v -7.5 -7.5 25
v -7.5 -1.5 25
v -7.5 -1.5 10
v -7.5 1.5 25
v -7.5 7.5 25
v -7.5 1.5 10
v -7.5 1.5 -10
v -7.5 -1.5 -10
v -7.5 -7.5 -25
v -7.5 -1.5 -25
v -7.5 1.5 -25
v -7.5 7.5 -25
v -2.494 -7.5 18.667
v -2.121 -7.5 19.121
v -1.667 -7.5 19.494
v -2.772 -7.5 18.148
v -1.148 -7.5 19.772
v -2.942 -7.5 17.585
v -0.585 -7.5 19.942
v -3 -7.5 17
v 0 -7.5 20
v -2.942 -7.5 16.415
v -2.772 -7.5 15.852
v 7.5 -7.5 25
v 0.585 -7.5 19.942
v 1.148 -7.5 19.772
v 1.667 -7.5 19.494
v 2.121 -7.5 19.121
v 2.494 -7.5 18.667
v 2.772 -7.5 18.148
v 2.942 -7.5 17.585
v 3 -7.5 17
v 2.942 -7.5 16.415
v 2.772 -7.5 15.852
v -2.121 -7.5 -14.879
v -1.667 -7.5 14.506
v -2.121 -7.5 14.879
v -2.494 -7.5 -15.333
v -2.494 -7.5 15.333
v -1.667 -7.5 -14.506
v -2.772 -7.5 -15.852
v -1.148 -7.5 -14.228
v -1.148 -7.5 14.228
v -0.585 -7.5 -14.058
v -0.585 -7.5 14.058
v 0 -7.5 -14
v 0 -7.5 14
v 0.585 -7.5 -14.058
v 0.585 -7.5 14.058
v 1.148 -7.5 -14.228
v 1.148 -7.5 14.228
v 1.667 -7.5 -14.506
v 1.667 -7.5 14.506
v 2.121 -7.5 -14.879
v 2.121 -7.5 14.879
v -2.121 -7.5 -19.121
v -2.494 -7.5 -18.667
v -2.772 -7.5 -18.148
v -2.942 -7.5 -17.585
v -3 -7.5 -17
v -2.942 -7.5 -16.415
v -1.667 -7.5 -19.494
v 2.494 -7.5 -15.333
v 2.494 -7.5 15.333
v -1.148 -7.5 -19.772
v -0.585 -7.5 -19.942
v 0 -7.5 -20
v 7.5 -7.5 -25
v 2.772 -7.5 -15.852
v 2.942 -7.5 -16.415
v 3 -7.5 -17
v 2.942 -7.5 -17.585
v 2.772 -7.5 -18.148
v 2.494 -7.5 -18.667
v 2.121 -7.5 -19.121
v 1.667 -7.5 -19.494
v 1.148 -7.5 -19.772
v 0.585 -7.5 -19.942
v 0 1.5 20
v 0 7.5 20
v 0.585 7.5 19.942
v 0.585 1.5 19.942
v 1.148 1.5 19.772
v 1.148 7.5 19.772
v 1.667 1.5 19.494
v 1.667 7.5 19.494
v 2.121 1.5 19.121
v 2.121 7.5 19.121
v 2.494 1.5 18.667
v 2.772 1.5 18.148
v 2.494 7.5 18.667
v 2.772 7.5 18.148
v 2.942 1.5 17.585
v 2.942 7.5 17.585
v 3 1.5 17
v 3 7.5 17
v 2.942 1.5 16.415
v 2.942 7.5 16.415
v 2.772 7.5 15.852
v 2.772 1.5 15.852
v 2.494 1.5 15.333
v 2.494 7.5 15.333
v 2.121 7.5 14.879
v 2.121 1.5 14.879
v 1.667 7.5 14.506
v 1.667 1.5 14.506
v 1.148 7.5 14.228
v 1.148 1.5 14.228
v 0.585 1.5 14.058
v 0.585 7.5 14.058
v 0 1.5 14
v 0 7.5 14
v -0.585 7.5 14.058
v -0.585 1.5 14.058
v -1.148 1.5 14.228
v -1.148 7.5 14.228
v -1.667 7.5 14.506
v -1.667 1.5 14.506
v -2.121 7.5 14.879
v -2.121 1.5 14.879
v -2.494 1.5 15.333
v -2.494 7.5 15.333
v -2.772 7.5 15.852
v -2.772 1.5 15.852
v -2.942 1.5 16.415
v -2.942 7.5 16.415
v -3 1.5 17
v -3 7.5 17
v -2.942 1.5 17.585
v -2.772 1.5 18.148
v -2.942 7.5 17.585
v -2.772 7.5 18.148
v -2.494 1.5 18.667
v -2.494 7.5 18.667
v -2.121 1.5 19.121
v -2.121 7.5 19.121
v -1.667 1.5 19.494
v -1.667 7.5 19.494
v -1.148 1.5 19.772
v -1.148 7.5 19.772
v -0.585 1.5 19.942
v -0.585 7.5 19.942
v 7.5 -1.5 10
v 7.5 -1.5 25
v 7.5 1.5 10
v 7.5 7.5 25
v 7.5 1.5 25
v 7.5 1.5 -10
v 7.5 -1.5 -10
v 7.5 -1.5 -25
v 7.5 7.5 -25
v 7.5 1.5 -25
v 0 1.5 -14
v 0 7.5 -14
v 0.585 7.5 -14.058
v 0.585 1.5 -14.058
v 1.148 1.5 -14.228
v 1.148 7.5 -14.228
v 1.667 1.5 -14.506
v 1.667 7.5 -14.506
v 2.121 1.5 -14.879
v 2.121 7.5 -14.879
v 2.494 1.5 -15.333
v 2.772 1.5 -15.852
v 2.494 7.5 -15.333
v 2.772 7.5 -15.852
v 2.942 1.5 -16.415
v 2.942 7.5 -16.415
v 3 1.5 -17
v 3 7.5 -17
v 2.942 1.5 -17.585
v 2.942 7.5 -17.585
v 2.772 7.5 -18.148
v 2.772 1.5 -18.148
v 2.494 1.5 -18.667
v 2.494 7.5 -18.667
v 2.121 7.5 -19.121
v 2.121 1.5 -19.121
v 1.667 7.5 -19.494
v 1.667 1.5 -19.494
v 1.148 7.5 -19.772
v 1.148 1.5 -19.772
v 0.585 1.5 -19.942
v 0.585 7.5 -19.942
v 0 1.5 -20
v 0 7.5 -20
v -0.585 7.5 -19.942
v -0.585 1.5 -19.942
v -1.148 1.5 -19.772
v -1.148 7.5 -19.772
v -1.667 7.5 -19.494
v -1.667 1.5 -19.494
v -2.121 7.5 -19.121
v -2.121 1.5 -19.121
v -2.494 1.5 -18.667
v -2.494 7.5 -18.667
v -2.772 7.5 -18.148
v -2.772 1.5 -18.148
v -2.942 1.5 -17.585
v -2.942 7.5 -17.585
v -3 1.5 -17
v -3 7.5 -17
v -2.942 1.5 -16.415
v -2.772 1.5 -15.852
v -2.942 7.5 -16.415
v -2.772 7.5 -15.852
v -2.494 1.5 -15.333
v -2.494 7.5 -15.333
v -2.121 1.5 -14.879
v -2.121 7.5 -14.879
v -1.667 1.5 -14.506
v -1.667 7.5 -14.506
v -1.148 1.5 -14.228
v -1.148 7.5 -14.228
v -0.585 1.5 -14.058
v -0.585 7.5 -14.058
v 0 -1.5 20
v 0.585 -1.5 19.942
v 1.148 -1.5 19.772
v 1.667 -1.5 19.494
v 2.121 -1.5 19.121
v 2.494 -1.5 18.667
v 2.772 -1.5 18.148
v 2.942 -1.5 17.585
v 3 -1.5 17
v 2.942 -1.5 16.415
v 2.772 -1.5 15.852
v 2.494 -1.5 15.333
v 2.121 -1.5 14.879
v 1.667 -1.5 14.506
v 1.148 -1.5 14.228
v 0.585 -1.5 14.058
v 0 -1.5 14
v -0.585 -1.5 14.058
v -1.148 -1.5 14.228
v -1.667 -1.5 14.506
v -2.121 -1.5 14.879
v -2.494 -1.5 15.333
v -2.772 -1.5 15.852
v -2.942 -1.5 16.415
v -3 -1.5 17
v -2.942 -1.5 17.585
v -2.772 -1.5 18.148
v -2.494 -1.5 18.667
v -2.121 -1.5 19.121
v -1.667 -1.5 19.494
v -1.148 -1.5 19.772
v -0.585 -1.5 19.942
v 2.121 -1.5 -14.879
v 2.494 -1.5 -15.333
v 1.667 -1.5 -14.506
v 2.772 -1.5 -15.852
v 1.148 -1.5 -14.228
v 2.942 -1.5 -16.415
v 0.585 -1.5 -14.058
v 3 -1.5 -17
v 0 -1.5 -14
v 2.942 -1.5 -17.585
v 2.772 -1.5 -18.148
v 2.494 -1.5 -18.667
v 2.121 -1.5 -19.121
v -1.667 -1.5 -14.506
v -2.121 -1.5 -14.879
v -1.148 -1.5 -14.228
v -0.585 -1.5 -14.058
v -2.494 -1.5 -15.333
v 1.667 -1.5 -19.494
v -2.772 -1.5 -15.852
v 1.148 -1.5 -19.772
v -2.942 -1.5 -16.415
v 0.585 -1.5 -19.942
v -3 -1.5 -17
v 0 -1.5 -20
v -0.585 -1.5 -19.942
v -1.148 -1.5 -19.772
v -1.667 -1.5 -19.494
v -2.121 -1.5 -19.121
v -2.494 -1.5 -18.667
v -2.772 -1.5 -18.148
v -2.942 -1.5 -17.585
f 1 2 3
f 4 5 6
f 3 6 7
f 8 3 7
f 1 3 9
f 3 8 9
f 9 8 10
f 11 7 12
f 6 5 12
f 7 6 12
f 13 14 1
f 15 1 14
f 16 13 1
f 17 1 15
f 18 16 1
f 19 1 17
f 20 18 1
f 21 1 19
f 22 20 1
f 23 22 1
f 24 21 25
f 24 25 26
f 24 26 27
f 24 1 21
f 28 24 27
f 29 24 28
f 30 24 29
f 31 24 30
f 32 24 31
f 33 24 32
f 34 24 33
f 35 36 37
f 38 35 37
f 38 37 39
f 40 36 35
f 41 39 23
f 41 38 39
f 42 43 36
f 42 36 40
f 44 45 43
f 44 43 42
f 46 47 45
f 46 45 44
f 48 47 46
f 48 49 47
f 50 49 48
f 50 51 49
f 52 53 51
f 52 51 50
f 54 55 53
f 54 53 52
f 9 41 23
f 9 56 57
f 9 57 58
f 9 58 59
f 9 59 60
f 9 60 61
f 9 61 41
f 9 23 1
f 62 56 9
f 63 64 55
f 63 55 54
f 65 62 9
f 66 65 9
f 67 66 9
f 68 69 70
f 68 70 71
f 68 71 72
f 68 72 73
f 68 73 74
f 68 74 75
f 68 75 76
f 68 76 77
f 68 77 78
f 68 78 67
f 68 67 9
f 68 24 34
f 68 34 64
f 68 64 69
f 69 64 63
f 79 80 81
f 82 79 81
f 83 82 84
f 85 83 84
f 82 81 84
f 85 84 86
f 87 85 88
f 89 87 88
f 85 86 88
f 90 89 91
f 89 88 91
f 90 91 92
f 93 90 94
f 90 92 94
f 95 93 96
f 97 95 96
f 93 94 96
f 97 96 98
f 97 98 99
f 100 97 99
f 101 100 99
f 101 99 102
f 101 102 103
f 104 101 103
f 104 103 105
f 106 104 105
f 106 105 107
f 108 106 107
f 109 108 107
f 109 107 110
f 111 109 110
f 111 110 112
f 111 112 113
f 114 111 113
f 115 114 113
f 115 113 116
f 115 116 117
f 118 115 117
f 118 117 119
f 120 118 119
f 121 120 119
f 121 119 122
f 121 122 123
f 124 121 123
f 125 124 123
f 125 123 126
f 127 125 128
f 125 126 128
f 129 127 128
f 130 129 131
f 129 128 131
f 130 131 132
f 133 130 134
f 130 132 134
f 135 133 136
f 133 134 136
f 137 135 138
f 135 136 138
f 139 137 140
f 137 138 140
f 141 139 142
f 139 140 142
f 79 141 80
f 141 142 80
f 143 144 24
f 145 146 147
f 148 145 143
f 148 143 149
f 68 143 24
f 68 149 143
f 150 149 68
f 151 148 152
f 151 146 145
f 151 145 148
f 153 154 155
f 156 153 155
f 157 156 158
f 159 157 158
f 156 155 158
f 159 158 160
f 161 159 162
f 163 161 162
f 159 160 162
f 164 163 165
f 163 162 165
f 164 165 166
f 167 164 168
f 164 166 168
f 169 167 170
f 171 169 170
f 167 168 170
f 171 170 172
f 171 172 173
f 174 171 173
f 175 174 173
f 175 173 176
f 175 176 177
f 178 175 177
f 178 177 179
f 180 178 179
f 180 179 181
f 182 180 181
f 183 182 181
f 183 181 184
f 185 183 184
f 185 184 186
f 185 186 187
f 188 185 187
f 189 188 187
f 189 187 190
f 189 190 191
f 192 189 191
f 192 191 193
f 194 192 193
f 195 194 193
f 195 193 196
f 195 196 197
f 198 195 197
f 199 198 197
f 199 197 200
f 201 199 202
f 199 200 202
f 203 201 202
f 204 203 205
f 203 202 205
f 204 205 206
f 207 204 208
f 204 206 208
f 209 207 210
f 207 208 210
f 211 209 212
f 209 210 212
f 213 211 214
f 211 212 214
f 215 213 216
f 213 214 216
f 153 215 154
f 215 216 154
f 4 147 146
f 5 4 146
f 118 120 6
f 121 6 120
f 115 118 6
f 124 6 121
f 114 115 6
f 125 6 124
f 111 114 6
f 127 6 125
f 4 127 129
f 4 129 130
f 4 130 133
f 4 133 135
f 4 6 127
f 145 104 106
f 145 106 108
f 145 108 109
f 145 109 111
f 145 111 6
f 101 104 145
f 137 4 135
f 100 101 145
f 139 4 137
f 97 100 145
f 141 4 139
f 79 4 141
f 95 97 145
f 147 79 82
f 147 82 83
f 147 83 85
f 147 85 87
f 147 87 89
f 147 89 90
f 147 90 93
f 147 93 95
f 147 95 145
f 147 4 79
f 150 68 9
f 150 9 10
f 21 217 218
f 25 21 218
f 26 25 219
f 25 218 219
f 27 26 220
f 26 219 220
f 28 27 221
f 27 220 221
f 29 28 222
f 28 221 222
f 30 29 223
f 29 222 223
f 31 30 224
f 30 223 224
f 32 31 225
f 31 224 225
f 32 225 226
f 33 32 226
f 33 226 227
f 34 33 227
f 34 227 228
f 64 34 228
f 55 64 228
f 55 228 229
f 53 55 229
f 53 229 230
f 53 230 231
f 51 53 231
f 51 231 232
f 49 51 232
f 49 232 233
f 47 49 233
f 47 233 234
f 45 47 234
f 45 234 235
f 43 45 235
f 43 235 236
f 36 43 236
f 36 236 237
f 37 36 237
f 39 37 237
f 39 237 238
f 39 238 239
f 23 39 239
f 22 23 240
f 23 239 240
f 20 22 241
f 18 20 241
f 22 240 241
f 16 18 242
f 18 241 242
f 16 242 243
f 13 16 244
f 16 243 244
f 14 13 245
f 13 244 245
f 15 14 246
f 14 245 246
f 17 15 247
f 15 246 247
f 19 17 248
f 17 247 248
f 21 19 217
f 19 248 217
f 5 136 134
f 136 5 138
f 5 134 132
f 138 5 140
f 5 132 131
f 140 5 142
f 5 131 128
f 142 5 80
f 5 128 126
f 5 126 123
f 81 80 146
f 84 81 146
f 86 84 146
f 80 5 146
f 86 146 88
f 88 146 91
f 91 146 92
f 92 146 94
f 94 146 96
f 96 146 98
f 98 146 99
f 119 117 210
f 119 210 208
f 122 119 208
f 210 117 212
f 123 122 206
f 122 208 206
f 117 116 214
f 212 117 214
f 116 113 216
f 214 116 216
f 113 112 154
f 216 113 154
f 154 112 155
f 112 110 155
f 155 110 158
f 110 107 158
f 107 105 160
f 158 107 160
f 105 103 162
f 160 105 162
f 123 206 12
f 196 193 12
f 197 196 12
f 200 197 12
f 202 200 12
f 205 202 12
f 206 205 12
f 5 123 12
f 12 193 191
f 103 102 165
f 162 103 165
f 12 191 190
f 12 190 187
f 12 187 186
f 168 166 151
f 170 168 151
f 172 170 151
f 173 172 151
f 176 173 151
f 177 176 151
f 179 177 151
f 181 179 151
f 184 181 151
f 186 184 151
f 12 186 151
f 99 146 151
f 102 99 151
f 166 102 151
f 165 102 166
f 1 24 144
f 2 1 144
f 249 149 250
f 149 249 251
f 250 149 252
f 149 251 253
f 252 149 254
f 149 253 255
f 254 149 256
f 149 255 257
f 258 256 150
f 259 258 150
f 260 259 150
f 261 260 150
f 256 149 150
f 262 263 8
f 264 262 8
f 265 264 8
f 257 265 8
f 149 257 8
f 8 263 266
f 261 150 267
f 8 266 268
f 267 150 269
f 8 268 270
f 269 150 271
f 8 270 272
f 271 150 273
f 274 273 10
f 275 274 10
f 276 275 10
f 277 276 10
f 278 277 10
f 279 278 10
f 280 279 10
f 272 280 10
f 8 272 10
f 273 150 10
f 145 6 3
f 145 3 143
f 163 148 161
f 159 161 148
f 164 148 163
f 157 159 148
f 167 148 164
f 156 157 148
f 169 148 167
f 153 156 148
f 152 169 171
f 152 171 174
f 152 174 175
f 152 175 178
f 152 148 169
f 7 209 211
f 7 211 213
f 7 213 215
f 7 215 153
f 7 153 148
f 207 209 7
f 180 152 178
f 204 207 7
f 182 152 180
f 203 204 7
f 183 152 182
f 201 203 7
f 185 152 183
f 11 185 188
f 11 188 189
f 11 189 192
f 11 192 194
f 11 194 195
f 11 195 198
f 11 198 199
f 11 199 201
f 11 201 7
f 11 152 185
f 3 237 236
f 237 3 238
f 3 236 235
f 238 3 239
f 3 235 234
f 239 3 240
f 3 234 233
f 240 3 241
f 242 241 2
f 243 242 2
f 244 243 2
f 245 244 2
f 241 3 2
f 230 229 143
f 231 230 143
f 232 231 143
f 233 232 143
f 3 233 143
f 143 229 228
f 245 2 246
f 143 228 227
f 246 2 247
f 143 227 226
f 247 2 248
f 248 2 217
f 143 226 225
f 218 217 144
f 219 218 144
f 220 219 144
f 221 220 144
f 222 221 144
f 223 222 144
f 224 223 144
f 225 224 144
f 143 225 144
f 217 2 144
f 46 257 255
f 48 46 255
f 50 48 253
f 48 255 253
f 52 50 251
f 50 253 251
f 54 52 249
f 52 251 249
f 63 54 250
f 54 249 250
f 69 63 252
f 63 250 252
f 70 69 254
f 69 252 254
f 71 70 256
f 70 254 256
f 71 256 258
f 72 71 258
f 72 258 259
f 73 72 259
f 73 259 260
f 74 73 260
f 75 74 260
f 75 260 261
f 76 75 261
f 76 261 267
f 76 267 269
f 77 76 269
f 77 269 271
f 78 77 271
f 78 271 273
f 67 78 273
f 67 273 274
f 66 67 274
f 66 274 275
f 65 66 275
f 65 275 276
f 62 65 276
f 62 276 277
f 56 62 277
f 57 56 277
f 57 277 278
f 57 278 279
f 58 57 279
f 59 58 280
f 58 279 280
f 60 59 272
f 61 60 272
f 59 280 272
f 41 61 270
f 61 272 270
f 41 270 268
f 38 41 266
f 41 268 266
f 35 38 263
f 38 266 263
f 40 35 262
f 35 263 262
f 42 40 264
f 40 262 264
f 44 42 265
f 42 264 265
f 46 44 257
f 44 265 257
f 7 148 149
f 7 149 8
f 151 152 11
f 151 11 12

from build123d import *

# Parameters (mm, degrees)
ESQUISSE1_W             = 50
ESQUISSE1_H             = 15
BOSS_EXTRU_1_DEPTH      = 7.5
ESQUISSE3_R             = 3
ENL_V_MAT_EXTRU_2_DEPTH = 31.103986447
ESQUISSE4_W             = 15
ESQUISSE4_H             = 3
ENL_V_MAT_EXTRU_3_DEPTH = 15
ESQUISSE5_W             = 15
ESQUISSE5_H             = 3
ENL_V_MAT_EXTRU_4_DEPTH = 15


with BuildPart() as part:
    # Esquisse1 → Boss.-Extru.1 (new, symmetric)
    with BuildSketch(Plane(origin=(0, 0, 0), x_dir=(0, 0, -1), z_dir=(1, 0, 0))):
        Rectangle(ESQUISSE1_W, ESQUISSE1_H)
    extrude(amount=BOSS_EXTRU_1_DEPTH, both=True)

    # Esquisse3 → Enlèv. mat.-Extru.2 (cut, through all)
    with BuildSketch(Plane(origin=(0, 7.5, 0), x_dir=(1, 0, 0), z_dir=(0, 1, 0))):
        with Locations(Location((0, 17, 0), (0, 0, 270))):
            Circle(ESQUISSE3_R)
        with Locations(Location((0, -17, 0), (0, 0, 270))):
            Circle(ESQUISSE3_R)
    extrude(amount=-ENL_V_MAT_EXTRU_2_DEPTH, mode=Mode.SUBTRACT)

    # Esquisse4 → Enlèv. mat.-Extru.3 (cut)
    with BuildSketch(Plane.XY.offset(25)):
        Rectangle(ESQUISSE4_W, ESQUISSE4_H)
    extrude(amount=-ENL_V_MAT_EXTRU_3_DEPTH, mode=Mode.SUBTRACT)

    # Esquisse5 → Enlèv. mat.-Extru.4 (cut)
    with BuildSketch(Plane(origin=(0, 0, -25), x_dir=(-1, 0, 0), z_dir=(0, 0, -1))):
        Rectangle(ESQUISSE5_W, ESQUISSE5_H)
    extrude(amount=-ENL_V_MAT_EXTRU_4_DEPTH, mode=Mode.SUBTRACT)


solid = part.part
